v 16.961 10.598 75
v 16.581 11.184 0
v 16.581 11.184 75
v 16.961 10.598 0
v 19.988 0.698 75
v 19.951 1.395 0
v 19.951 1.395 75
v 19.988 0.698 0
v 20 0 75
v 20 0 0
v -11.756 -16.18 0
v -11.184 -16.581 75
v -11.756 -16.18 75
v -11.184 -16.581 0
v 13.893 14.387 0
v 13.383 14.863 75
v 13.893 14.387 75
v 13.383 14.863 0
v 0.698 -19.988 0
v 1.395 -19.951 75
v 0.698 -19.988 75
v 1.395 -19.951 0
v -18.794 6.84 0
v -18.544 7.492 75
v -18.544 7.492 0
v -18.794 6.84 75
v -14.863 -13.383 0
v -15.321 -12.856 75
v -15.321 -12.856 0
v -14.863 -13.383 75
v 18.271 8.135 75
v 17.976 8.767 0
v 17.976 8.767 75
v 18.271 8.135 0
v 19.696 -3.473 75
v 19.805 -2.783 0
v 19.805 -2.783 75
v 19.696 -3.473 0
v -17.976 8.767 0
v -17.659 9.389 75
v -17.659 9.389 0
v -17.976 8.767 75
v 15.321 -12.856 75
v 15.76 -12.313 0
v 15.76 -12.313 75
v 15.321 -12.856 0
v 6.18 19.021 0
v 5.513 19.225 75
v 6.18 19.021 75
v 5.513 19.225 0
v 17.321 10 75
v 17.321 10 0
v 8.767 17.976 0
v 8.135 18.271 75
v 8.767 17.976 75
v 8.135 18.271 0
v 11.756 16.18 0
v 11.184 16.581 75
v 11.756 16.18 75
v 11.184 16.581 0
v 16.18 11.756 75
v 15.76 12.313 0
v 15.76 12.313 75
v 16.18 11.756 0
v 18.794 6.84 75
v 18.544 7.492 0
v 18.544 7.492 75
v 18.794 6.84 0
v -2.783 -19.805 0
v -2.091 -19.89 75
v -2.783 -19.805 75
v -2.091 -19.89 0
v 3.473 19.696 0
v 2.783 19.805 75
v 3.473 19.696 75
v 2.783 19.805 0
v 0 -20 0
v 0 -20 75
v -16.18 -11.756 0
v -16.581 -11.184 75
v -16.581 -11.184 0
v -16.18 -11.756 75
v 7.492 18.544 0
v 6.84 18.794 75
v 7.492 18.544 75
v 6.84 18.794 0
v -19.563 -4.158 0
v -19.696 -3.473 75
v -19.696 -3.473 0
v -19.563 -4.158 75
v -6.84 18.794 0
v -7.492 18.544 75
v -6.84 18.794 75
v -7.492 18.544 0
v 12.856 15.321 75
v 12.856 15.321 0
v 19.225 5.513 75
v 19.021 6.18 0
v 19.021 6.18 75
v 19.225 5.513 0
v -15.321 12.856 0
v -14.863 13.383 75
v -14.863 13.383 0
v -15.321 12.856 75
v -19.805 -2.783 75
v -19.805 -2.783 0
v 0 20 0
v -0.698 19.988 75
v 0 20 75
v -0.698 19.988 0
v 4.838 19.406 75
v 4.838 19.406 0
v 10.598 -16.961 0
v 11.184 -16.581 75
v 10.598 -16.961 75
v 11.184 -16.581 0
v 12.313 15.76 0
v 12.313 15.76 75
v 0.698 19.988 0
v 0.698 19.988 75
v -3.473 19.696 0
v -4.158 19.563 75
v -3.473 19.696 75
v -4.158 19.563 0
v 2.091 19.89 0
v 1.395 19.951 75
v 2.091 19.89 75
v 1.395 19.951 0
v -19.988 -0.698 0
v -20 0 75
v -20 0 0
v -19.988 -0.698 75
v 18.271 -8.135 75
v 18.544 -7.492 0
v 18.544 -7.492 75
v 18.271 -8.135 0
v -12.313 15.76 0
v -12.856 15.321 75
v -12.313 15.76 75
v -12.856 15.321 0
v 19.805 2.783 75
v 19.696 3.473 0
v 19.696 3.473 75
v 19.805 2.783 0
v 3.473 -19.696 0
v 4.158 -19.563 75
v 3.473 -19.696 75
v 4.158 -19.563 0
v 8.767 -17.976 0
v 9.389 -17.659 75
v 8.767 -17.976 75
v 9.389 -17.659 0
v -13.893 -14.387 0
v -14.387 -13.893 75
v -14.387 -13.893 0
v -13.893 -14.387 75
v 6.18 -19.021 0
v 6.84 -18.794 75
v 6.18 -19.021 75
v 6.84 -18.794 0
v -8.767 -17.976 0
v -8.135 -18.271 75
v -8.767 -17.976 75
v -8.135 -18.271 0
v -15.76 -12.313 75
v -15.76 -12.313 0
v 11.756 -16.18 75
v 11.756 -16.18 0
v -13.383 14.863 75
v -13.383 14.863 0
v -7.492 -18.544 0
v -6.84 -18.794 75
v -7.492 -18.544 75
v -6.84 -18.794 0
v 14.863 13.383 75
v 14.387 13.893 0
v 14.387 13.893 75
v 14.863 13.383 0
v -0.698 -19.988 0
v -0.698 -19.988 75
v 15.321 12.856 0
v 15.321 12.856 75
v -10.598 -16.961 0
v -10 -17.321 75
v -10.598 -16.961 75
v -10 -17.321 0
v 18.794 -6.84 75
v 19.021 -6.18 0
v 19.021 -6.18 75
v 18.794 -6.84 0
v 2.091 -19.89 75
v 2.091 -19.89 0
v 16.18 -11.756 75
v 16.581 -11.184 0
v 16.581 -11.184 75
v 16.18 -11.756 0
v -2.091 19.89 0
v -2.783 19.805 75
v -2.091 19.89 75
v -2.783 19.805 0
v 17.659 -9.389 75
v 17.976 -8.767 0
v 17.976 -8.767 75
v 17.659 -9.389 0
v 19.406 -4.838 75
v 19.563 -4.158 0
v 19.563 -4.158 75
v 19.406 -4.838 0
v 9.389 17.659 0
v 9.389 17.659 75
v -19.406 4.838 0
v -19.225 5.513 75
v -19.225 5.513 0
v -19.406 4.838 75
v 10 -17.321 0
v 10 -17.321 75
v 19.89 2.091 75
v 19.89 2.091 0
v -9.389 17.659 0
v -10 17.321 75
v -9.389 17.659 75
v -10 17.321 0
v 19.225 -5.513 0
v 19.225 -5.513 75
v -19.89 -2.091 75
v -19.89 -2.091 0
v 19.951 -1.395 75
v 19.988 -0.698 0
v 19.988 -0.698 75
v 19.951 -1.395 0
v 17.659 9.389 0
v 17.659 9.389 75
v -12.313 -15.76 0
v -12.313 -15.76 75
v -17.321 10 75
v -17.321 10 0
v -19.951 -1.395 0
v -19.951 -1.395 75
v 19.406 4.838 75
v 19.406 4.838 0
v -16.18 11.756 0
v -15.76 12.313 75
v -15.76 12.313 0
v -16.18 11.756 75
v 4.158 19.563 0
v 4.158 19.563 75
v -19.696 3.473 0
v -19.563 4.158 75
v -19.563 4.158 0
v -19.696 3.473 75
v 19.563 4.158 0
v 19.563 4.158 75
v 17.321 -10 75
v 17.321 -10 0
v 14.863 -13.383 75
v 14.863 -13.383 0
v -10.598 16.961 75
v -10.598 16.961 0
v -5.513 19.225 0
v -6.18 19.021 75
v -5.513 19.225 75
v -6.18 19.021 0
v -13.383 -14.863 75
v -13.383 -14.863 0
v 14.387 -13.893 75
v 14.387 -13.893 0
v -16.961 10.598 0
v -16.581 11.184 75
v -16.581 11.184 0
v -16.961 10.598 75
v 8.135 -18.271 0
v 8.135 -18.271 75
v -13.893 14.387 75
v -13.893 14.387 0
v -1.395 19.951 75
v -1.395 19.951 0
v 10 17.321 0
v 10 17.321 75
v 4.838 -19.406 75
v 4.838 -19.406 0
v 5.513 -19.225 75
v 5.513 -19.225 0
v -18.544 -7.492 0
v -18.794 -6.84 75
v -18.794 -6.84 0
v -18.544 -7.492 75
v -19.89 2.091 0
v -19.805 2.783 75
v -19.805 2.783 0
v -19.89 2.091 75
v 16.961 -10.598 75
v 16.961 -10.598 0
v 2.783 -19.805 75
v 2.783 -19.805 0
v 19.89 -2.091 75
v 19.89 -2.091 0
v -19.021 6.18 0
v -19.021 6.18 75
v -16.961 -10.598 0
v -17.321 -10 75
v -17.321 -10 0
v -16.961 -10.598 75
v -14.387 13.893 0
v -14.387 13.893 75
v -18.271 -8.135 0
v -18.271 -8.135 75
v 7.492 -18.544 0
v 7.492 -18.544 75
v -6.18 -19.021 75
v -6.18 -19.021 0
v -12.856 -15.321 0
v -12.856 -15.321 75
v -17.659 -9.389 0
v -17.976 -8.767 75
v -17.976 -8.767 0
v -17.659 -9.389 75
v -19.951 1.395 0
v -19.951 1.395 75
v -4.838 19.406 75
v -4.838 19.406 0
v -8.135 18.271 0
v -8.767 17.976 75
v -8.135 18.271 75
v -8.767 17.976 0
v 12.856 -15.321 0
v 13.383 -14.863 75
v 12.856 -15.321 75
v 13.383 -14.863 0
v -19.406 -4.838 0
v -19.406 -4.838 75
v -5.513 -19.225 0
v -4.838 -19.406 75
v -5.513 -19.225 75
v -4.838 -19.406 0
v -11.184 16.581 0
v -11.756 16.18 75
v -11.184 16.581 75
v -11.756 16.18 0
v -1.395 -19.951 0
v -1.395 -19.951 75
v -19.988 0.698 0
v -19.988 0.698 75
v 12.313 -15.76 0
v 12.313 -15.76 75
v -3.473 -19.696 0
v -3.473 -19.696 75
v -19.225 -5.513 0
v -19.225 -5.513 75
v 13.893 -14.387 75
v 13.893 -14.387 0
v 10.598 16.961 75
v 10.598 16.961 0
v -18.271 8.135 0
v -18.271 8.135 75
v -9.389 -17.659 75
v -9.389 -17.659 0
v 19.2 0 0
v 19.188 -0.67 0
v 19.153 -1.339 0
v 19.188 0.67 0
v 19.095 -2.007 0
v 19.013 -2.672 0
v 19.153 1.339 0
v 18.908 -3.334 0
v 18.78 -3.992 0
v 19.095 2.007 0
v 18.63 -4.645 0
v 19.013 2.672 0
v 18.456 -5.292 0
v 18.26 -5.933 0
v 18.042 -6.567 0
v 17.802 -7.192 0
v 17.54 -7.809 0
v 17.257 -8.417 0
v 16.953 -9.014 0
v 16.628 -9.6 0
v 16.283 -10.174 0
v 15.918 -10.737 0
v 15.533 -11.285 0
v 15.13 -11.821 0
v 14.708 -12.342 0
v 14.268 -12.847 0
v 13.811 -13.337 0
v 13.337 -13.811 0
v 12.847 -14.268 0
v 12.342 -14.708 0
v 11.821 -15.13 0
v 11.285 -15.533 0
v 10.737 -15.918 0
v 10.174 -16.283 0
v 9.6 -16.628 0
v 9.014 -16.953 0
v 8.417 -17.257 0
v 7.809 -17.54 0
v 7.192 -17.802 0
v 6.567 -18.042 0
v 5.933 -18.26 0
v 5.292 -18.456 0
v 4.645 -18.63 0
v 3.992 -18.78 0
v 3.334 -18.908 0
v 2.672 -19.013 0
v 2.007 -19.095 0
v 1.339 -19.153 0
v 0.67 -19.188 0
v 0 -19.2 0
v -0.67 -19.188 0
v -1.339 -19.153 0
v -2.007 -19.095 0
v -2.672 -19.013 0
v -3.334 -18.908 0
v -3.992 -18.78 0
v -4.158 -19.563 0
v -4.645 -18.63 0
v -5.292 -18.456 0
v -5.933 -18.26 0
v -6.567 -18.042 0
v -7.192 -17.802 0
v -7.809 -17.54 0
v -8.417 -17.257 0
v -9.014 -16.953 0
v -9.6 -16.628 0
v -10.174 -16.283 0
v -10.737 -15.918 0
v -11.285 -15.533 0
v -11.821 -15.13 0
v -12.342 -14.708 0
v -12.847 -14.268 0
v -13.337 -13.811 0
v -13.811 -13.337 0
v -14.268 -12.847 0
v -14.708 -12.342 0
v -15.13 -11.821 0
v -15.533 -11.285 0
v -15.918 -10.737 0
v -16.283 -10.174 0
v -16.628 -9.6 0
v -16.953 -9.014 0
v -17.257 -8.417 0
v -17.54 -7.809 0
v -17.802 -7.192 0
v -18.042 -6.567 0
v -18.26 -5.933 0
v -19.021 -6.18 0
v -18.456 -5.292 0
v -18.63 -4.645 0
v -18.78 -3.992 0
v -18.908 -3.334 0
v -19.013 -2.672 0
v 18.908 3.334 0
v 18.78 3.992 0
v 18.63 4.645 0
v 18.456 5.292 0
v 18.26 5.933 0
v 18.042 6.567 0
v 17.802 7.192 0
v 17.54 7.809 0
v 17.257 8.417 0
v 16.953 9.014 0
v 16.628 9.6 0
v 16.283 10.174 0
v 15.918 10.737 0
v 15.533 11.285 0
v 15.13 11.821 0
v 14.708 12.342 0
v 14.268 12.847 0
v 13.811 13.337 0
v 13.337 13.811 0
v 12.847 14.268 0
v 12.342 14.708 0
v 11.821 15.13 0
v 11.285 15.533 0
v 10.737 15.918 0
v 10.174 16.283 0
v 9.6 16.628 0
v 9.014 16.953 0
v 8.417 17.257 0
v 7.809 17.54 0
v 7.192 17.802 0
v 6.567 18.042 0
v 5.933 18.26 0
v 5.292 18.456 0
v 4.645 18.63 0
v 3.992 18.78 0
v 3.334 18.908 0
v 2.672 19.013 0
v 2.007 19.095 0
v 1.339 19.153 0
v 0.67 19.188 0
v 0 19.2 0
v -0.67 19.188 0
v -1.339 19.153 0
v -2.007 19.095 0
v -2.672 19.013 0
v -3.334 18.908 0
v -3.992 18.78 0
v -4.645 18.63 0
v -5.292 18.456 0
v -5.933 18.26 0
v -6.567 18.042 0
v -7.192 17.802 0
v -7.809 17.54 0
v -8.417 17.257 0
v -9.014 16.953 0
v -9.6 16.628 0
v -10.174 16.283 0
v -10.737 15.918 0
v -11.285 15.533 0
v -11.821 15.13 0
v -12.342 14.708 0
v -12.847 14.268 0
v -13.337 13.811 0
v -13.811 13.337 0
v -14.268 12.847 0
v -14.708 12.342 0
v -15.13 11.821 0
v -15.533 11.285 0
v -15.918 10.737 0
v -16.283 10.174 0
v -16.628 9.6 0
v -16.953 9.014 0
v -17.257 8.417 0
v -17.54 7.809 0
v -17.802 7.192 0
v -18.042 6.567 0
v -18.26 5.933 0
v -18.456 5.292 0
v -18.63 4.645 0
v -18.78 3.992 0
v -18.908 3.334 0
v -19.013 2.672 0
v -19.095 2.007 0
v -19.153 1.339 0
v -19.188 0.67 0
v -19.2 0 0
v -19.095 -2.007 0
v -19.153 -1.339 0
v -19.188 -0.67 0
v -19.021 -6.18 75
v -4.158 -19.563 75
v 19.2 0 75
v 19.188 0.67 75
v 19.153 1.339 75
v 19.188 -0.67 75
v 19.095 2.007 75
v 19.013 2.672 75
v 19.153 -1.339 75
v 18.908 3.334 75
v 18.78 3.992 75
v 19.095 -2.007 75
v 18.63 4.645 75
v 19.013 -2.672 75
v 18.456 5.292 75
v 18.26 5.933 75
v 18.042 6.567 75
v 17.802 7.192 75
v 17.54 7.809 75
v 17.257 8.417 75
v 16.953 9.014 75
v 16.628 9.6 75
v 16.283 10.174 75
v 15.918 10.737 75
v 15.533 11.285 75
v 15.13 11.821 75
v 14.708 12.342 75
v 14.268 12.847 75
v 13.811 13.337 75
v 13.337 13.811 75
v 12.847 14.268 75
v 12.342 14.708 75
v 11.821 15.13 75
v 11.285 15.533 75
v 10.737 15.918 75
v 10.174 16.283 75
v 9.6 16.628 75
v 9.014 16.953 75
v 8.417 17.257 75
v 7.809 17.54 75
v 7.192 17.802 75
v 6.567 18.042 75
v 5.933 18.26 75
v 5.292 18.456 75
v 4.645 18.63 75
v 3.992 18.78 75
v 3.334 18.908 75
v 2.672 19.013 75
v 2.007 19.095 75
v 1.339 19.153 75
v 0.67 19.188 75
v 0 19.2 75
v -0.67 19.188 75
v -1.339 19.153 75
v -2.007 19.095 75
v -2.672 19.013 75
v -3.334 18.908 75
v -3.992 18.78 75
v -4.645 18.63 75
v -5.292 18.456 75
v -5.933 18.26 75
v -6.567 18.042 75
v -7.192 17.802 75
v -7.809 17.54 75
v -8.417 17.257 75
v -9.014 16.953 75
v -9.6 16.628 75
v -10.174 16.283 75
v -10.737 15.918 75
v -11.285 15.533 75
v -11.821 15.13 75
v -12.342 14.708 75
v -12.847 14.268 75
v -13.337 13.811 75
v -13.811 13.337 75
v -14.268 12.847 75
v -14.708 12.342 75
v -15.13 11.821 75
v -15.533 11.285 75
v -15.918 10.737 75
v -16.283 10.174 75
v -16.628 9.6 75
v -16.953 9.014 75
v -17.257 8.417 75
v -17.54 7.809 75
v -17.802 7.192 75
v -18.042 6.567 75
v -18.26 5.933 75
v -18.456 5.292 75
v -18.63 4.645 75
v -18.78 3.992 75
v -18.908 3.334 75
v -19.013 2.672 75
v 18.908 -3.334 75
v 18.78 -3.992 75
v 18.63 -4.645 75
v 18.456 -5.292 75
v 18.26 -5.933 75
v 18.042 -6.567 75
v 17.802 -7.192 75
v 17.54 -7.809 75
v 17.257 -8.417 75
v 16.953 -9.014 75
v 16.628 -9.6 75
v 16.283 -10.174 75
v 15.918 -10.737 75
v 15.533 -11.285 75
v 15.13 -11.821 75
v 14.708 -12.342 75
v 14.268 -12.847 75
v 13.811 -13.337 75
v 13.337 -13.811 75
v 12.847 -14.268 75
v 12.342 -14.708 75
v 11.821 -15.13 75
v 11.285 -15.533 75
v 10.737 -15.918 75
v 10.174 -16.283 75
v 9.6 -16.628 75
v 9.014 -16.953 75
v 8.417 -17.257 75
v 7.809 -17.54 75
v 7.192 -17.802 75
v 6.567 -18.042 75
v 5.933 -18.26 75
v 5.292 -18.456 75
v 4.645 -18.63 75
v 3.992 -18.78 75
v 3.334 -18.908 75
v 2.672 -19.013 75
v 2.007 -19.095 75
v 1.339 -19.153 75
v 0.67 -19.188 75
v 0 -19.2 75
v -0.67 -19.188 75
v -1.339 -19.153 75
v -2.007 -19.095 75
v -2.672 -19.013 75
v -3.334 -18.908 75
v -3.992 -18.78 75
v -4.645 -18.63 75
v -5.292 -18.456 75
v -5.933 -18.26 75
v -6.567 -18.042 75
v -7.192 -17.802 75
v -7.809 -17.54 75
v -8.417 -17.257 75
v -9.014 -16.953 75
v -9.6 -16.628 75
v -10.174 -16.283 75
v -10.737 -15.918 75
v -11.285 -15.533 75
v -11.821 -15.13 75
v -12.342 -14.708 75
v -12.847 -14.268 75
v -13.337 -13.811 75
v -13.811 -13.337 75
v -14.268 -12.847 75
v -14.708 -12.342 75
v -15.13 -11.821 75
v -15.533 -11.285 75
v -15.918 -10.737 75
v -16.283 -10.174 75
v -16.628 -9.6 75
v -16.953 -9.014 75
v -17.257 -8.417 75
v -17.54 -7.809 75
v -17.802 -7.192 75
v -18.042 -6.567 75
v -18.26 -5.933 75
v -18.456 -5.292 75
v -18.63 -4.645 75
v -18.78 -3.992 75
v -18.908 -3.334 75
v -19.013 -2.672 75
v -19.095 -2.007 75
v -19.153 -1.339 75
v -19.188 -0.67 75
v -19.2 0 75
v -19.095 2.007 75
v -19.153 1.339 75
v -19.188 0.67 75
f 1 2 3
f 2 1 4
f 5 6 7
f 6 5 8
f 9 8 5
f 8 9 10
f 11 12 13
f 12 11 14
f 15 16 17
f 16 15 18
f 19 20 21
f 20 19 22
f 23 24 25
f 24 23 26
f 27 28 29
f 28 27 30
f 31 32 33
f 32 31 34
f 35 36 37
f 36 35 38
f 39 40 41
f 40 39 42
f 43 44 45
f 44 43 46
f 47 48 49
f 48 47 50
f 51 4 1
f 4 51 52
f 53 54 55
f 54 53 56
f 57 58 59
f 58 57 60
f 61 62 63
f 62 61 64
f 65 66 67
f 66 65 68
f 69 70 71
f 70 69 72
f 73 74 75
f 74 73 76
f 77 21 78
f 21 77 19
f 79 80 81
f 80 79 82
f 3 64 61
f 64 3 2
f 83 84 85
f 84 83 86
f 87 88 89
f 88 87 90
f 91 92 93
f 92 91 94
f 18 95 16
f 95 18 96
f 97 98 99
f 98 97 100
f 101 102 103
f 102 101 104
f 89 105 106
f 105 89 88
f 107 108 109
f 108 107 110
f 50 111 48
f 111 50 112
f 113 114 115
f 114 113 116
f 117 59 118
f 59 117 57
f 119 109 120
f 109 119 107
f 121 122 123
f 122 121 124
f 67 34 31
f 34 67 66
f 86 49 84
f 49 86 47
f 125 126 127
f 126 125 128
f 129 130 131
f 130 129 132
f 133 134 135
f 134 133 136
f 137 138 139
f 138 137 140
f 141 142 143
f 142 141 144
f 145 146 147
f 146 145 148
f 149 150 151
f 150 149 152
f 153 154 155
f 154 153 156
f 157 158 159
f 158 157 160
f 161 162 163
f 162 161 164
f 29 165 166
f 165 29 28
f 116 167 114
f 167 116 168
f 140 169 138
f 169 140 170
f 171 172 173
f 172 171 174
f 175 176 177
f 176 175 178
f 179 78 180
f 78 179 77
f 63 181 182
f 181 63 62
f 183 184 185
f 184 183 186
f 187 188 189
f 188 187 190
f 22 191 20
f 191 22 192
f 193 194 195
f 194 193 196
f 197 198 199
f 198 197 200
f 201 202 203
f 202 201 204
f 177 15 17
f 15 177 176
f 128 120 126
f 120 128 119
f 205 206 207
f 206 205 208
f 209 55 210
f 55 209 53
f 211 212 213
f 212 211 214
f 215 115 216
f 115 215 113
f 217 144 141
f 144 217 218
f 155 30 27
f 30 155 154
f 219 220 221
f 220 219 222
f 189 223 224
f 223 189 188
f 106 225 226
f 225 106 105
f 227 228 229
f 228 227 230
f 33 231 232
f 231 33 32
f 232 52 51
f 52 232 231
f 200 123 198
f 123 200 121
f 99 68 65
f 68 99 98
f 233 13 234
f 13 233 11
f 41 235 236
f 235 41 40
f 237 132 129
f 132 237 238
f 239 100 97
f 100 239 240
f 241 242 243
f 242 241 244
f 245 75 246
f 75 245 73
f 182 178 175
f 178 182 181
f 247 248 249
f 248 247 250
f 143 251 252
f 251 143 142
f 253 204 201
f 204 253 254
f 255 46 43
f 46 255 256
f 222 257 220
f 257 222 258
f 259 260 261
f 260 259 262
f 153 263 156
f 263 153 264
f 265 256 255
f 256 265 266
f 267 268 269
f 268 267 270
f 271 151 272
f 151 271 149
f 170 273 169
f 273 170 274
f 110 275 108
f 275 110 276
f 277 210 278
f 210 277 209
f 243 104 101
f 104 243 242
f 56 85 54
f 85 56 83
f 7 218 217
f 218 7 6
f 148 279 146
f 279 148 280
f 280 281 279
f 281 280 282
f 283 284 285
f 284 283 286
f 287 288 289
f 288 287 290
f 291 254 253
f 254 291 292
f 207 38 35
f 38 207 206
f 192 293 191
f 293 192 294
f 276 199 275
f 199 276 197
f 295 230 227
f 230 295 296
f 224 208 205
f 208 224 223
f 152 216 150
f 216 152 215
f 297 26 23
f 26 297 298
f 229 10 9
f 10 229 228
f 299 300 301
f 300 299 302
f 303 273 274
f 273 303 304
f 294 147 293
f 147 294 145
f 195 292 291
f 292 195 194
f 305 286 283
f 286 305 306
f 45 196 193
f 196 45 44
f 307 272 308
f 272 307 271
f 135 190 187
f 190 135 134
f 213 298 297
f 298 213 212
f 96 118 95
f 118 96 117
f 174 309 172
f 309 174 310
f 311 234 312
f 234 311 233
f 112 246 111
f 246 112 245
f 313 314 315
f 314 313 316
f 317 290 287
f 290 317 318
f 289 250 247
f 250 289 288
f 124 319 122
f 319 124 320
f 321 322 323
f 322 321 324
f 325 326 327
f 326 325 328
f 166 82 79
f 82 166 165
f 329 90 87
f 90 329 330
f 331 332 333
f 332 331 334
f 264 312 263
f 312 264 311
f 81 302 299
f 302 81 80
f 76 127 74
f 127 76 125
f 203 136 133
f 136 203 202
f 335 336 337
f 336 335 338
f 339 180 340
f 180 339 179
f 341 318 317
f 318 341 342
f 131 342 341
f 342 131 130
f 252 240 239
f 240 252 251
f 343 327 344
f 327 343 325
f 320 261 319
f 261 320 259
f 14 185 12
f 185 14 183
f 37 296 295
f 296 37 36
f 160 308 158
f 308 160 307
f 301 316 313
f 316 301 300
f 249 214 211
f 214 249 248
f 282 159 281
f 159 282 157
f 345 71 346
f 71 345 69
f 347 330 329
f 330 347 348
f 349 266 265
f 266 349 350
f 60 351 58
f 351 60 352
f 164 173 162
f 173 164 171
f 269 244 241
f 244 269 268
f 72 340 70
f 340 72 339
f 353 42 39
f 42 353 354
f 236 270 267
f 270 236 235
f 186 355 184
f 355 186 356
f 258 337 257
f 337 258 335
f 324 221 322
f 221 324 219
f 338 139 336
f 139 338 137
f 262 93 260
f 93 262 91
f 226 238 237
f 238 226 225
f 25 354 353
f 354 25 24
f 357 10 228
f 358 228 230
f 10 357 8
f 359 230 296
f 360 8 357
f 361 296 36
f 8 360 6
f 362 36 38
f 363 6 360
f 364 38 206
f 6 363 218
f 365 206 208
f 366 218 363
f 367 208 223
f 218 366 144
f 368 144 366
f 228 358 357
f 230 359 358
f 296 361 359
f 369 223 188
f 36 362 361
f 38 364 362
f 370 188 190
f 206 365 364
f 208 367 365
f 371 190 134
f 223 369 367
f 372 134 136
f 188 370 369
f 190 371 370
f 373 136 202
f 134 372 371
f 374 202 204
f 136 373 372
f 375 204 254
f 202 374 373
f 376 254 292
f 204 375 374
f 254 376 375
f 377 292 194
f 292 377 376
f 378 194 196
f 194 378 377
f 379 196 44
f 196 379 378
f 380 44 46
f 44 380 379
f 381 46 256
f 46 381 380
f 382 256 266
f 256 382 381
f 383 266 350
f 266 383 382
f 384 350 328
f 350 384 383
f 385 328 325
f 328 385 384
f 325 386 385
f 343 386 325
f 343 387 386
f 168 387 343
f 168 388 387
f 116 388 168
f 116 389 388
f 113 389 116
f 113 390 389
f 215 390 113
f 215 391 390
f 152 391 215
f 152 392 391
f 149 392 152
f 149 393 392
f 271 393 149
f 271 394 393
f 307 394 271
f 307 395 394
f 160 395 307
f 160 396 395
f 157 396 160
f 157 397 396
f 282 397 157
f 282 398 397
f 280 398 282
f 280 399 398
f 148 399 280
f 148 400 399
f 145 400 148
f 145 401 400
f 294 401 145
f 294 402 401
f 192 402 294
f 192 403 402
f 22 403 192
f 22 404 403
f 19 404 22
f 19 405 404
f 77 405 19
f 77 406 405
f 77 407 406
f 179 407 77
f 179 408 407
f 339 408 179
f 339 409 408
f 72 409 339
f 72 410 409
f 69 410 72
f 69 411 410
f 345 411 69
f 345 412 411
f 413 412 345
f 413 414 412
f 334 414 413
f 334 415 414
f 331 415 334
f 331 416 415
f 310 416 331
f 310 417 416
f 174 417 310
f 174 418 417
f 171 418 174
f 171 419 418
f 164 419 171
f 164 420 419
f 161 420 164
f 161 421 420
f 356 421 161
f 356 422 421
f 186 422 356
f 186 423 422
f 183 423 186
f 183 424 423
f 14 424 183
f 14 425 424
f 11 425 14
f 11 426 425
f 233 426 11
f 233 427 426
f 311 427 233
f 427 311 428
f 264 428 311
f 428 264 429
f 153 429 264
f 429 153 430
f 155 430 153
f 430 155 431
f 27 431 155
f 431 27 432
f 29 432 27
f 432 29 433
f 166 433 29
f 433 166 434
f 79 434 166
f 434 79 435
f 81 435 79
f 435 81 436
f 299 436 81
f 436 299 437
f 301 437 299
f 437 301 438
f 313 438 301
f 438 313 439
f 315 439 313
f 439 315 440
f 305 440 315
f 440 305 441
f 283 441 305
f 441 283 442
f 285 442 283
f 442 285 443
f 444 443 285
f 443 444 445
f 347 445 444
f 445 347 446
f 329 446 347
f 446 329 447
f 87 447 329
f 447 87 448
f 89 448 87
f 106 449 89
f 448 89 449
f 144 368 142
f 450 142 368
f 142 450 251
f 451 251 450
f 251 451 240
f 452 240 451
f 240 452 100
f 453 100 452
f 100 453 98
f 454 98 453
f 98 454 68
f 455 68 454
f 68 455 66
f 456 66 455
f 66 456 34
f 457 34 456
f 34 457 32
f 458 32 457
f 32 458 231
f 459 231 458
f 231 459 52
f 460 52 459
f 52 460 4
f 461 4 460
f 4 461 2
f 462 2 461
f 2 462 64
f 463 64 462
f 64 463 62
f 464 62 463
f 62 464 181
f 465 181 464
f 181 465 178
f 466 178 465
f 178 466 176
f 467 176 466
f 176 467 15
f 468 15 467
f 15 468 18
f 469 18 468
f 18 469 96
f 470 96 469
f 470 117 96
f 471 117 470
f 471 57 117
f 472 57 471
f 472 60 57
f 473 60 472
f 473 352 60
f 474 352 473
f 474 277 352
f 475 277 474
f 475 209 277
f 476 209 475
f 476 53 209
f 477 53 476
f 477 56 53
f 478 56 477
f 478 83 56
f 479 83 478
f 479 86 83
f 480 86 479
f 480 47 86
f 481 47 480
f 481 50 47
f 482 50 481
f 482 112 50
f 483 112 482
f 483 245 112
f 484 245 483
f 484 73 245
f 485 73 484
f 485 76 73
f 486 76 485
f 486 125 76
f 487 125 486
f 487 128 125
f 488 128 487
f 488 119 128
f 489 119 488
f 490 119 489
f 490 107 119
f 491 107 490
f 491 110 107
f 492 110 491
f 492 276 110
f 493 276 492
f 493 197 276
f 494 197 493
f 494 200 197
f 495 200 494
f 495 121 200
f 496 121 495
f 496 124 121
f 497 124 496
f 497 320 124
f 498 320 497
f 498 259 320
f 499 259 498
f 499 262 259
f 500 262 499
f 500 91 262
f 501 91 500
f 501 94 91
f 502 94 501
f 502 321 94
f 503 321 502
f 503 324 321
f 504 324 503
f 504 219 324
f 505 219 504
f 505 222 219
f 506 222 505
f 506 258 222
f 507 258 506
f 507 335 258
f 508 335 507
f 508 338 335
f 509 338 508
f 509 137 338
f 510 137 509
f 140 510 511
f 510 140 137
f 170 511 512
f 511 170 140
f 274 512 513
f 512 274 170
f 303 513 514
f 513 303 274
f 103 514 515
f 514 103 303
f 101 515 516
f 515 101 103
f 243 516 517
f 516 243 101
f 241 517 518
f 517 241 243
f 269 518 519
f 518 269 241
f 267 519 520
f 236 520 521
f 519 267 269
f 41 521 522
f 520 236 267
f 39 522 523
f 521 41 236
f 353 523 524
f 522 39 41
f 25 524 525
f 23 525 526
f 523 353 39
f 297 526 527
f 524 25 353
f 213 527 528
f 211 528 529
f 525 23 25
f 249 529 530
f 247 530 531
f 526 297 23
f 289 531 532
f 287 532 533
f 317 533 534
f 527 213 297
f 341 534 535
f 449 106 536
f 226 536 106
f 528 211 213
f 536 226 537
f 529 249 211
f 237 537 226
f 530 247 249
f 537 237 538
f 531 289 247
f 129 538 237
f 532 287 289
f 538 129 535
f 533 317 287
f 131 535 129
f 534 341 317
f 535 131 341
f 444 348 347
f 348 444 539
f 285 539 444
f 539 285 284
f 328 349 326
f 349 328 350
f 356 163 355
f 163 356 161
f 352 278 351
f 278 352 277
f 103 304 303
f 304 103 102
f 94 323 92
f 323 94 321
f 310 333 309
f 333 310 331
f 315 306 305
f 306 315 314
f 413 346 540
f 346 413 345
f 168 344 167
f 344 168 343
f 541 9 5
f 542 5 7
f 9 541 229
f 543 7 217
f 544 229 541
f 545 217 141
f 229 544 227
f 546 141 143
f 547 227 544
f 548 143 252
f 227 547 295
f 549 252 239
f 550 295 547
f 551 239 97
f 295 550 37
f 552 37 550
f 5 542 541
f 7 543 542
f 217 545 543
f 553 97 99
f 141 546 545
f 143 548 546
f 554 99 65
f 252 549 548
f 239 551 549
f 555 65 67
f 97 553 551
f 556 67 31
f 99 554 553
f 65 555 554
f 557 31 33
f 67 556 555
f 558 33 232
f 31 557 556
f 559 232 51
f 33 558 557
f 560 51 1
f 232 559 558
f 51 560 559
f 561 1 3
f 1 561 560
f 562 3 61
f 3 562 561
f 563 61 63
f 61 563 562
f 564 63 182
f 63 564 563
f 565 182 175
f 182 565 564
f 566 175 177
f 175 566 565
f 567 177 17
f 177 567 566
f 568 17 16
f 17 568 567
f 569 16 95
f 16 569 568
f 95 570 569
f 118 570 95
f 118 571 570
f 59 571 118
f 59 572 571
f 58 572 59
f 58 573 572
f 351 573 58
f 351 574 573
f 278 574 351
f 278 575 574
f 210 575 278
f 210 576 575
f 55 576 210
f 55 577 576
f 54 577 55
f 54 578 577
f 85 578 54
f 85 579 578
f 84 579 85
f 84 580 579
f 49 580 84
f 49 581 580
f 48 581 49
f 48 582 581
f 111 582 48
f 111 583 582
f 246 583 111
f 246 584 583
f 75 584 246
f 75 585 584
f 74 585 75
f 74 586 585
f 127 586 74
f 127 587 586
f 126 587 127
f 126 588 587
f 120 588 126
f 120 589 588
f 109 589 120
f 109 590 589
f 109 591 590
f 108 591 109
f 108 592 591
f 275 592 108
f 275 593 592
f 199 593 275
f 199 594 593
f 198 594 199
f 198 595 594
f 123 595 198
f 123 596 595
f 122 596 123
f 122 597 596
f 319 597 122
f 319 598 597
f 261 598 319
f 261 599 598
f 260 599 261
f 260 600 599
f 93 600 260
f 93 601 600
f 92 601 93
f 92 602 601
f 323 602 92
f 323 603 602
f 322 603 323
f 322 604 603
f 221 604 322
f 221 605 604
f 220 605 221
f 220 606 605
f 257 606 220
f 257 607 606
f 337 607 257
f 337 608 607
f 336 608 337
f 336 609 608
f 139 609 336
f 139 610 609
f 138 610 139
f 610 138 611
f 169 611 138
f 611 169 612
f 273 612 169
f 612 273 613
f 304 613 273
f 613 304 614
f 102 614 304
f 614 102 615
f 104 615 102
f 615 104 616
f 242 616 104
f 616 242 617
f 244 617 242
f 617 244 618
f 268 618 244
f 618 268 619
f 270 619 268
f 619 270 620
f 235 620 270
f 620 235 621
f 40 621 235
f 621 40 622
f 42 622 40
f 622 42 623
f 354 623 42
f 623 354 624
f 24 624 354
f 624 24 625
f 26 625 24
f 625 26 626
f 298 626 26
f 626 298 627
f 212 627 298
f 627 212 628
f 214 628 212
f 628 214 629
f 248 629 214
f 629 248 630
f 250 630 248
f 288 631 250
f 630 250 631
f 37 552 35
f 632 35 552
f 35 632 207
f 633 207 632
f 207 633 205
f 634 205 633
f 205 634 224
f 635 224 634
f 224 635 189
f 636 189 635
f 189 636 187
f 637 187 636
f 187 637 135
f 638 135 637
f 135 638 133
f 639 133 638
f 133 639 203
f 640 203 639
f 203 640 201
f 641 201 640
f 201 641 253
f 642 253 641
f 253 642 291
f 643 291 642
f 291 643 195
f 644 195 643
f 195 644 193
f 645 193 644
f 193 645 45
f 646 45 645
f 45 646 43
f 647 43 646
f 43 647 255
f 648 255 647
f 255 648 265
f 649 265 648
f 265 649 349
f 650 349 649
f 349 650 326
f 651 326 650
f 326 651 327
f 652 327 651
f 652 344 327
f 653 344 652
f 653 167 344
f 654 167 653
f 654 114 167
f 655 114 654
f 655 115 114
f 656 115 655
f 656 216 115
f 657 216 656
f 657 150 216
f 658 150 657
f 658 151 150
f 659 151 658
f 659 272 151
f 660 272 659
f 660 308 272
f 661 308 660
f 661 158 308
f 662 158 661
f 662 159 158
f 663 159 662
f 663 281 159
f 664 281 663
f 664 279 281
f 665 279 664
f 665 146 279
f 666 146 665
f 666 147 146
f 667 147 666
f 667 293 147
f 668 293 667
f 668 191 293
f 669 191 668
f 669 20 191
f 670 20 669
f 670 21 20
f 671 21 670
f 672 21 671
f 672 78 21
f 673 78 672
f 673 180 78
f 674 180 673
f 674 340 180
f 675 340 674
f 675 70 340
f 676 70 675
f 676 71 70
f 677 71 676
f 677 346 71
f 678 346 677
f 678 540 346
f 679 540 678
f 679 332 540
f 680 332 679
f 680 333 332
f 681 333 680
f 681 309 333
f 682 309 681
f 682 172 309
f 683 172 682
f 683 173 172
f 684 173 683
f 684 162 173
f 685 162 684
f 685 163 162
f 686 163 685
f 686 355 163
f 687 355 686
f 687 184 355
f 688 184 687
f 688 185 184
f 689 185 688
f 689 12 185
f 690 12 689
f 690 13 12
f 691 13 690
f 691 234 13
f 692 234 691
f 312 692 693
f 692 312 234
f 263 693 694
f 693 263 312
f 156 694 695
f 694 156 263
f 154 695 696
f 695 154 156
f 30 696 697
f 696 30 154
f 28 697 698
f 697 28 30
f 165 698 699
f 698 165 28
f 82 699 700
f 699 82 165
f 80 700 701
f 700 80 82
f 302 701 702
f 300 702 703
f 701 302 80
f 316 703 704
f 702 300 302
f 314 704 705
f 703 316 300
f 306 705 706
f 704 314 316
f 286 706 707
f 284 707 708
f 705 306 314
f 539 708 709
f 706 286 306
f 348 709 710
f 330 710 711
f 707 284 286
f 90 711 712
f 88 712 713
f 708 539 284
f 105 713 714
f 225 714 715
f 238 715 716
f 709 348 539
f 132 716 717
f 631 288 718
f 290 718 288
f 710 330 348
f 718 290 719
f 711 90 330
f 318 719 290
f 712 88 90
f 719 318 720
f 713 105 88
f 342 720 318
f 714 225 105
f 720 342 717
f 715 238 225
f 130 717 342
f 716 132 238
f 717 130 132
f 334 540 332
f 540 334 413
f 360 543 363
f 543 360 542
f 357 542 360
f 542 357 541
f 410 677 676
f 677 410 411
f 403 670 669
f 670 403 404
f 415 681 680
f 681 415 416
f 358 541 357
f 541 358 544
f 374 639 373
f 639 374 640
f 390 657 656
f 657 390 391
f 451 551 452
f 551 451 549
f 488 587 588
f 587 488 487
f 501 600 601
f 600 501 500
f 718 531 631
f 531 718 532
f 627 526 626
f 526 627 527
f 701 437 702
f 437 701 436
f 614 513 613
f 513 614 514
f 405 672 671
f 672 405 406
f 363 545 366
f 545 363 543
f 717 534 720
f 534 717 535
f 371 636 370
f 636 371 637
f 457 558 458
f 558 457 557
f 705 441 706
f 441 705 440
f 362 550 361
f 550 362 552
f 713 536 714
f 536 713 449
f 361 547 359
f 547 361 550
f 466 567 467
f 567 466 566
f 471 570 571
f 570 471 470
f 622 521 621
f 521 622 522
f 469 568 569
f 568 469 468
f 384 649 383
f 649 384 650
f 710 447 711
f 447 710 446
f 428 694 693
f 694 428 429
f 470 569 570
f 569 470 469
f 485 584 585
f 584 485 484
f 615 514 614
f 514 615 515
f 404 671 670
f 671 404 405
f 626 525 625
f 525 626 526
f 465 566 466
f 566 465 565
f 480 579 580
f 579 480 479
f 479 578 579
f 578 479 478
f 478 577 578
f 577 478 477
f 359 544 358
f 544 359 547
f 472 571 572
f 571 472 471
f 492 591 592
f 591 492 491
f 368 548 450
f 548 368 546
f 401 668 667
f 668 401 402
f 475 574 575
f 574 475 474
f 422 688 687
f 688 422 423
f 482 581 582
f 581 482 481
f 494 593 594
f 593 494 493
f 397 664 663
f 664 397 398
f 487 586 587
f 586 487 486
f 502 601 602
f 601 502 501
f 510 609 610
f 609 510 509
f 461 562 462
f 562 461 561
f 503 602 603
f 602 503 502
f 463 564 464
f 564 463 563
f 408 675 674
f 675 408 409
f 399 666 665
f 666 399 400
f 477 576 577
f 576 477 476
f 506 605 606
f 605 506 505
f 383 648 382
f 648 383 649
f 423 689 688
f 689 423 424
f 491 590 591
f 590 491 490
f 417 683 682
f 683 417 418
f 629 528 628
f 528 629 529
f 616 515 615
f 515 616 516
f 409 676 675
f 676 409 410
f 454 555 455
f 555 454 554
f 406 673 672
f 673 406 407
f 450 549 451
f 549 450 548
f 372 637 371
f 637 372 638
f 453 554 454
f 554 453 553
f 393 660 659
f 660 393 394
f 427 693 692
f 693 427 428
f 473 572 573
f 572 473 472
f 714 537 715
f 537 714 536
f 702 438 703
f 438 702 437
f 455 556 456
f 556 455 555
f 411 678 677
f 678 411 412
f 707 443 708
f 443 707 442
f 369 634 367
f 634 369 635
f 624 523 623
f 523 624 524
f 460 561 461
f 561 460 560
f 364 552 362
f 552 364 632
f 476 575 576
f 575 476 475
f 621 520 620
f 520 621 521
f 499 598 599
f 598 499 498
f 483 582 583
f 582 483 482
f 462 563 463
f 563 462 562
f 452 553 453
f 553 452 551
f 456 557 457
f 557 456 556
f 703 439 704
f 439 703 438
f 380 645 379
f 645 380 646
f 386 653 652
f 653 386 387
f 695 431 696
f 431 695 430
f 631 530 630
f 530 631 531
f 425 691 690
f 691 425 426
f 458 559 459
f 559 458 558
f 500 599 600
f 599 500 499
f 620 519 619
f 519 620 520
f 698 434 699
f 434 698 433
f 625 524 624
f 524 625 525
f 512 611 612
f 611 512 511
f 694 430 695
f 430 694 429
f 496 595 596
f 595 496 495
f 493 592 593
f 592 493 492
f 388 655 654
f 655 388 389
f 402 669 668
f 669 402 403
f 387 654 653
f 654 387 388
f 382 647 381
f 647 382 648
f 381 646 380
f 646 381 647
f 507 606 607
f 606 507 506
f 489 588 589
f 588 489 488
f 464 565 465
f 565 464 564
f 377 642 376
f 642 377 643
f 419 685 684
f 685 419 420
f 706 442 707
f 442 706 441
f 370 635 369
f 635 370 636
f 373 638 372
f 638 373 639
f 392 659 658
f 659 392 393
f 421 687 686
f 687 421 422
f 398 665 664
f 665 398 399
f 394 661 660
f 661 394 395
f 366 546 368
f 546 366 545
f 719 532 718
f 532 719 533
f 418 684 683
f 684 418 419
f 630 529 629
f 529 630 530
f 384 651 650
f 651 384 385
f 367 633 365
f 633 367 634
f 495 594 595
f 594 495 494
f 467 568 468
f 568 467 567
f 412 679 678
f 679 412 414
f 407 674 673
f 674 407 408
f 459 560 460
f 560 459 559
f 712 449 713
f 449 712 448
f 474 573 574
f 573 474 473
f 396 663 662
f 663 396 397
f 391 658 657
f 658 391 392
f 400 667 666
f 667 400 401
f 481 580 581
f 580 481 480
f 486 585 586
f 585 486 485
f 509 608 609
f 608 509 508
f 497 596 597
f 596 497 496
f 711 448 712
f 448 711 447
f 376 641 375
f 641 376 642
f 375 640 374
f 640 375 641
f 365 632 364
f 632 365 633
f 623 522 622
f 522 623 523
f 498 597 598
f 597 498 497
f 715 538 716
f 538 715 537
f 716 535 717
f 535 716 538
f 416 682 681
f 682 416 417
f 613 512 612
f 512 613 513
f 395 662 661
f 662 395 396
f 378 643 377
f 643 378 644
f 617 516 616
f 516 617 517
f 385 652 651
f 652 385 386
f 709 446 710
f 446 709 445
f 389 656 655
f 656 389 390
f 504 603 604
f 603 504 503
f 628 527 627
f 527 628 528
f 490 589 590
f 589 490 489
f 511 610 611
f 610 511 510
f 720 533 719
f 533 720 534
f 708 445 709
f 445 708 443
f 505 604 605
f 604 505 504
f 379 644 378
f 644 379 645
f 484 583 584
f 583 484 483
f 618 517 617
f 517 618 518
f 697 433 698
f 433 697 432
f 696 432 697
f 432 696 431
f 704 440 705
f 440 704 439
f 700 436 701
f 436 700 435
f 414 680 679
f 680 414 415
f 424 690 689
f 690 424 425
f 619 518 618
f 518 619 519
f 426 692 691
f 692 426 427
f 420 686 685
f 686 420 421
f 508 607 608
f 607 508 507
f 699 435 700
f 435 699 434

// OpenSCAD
module tube(radius, length, wallThickness = 2){
  innerRadius = radius - wallThickness;
  translate([0,0,length/2])
  difference() {
    cylinder(h = length, r1=radius, r2=radius, center=true);
    cylinder(h = length+10, r1=innerRadius, r2=innerRadius, center=true);
  }
}

$fn = 180;
tube(20, 75, 0.8);
